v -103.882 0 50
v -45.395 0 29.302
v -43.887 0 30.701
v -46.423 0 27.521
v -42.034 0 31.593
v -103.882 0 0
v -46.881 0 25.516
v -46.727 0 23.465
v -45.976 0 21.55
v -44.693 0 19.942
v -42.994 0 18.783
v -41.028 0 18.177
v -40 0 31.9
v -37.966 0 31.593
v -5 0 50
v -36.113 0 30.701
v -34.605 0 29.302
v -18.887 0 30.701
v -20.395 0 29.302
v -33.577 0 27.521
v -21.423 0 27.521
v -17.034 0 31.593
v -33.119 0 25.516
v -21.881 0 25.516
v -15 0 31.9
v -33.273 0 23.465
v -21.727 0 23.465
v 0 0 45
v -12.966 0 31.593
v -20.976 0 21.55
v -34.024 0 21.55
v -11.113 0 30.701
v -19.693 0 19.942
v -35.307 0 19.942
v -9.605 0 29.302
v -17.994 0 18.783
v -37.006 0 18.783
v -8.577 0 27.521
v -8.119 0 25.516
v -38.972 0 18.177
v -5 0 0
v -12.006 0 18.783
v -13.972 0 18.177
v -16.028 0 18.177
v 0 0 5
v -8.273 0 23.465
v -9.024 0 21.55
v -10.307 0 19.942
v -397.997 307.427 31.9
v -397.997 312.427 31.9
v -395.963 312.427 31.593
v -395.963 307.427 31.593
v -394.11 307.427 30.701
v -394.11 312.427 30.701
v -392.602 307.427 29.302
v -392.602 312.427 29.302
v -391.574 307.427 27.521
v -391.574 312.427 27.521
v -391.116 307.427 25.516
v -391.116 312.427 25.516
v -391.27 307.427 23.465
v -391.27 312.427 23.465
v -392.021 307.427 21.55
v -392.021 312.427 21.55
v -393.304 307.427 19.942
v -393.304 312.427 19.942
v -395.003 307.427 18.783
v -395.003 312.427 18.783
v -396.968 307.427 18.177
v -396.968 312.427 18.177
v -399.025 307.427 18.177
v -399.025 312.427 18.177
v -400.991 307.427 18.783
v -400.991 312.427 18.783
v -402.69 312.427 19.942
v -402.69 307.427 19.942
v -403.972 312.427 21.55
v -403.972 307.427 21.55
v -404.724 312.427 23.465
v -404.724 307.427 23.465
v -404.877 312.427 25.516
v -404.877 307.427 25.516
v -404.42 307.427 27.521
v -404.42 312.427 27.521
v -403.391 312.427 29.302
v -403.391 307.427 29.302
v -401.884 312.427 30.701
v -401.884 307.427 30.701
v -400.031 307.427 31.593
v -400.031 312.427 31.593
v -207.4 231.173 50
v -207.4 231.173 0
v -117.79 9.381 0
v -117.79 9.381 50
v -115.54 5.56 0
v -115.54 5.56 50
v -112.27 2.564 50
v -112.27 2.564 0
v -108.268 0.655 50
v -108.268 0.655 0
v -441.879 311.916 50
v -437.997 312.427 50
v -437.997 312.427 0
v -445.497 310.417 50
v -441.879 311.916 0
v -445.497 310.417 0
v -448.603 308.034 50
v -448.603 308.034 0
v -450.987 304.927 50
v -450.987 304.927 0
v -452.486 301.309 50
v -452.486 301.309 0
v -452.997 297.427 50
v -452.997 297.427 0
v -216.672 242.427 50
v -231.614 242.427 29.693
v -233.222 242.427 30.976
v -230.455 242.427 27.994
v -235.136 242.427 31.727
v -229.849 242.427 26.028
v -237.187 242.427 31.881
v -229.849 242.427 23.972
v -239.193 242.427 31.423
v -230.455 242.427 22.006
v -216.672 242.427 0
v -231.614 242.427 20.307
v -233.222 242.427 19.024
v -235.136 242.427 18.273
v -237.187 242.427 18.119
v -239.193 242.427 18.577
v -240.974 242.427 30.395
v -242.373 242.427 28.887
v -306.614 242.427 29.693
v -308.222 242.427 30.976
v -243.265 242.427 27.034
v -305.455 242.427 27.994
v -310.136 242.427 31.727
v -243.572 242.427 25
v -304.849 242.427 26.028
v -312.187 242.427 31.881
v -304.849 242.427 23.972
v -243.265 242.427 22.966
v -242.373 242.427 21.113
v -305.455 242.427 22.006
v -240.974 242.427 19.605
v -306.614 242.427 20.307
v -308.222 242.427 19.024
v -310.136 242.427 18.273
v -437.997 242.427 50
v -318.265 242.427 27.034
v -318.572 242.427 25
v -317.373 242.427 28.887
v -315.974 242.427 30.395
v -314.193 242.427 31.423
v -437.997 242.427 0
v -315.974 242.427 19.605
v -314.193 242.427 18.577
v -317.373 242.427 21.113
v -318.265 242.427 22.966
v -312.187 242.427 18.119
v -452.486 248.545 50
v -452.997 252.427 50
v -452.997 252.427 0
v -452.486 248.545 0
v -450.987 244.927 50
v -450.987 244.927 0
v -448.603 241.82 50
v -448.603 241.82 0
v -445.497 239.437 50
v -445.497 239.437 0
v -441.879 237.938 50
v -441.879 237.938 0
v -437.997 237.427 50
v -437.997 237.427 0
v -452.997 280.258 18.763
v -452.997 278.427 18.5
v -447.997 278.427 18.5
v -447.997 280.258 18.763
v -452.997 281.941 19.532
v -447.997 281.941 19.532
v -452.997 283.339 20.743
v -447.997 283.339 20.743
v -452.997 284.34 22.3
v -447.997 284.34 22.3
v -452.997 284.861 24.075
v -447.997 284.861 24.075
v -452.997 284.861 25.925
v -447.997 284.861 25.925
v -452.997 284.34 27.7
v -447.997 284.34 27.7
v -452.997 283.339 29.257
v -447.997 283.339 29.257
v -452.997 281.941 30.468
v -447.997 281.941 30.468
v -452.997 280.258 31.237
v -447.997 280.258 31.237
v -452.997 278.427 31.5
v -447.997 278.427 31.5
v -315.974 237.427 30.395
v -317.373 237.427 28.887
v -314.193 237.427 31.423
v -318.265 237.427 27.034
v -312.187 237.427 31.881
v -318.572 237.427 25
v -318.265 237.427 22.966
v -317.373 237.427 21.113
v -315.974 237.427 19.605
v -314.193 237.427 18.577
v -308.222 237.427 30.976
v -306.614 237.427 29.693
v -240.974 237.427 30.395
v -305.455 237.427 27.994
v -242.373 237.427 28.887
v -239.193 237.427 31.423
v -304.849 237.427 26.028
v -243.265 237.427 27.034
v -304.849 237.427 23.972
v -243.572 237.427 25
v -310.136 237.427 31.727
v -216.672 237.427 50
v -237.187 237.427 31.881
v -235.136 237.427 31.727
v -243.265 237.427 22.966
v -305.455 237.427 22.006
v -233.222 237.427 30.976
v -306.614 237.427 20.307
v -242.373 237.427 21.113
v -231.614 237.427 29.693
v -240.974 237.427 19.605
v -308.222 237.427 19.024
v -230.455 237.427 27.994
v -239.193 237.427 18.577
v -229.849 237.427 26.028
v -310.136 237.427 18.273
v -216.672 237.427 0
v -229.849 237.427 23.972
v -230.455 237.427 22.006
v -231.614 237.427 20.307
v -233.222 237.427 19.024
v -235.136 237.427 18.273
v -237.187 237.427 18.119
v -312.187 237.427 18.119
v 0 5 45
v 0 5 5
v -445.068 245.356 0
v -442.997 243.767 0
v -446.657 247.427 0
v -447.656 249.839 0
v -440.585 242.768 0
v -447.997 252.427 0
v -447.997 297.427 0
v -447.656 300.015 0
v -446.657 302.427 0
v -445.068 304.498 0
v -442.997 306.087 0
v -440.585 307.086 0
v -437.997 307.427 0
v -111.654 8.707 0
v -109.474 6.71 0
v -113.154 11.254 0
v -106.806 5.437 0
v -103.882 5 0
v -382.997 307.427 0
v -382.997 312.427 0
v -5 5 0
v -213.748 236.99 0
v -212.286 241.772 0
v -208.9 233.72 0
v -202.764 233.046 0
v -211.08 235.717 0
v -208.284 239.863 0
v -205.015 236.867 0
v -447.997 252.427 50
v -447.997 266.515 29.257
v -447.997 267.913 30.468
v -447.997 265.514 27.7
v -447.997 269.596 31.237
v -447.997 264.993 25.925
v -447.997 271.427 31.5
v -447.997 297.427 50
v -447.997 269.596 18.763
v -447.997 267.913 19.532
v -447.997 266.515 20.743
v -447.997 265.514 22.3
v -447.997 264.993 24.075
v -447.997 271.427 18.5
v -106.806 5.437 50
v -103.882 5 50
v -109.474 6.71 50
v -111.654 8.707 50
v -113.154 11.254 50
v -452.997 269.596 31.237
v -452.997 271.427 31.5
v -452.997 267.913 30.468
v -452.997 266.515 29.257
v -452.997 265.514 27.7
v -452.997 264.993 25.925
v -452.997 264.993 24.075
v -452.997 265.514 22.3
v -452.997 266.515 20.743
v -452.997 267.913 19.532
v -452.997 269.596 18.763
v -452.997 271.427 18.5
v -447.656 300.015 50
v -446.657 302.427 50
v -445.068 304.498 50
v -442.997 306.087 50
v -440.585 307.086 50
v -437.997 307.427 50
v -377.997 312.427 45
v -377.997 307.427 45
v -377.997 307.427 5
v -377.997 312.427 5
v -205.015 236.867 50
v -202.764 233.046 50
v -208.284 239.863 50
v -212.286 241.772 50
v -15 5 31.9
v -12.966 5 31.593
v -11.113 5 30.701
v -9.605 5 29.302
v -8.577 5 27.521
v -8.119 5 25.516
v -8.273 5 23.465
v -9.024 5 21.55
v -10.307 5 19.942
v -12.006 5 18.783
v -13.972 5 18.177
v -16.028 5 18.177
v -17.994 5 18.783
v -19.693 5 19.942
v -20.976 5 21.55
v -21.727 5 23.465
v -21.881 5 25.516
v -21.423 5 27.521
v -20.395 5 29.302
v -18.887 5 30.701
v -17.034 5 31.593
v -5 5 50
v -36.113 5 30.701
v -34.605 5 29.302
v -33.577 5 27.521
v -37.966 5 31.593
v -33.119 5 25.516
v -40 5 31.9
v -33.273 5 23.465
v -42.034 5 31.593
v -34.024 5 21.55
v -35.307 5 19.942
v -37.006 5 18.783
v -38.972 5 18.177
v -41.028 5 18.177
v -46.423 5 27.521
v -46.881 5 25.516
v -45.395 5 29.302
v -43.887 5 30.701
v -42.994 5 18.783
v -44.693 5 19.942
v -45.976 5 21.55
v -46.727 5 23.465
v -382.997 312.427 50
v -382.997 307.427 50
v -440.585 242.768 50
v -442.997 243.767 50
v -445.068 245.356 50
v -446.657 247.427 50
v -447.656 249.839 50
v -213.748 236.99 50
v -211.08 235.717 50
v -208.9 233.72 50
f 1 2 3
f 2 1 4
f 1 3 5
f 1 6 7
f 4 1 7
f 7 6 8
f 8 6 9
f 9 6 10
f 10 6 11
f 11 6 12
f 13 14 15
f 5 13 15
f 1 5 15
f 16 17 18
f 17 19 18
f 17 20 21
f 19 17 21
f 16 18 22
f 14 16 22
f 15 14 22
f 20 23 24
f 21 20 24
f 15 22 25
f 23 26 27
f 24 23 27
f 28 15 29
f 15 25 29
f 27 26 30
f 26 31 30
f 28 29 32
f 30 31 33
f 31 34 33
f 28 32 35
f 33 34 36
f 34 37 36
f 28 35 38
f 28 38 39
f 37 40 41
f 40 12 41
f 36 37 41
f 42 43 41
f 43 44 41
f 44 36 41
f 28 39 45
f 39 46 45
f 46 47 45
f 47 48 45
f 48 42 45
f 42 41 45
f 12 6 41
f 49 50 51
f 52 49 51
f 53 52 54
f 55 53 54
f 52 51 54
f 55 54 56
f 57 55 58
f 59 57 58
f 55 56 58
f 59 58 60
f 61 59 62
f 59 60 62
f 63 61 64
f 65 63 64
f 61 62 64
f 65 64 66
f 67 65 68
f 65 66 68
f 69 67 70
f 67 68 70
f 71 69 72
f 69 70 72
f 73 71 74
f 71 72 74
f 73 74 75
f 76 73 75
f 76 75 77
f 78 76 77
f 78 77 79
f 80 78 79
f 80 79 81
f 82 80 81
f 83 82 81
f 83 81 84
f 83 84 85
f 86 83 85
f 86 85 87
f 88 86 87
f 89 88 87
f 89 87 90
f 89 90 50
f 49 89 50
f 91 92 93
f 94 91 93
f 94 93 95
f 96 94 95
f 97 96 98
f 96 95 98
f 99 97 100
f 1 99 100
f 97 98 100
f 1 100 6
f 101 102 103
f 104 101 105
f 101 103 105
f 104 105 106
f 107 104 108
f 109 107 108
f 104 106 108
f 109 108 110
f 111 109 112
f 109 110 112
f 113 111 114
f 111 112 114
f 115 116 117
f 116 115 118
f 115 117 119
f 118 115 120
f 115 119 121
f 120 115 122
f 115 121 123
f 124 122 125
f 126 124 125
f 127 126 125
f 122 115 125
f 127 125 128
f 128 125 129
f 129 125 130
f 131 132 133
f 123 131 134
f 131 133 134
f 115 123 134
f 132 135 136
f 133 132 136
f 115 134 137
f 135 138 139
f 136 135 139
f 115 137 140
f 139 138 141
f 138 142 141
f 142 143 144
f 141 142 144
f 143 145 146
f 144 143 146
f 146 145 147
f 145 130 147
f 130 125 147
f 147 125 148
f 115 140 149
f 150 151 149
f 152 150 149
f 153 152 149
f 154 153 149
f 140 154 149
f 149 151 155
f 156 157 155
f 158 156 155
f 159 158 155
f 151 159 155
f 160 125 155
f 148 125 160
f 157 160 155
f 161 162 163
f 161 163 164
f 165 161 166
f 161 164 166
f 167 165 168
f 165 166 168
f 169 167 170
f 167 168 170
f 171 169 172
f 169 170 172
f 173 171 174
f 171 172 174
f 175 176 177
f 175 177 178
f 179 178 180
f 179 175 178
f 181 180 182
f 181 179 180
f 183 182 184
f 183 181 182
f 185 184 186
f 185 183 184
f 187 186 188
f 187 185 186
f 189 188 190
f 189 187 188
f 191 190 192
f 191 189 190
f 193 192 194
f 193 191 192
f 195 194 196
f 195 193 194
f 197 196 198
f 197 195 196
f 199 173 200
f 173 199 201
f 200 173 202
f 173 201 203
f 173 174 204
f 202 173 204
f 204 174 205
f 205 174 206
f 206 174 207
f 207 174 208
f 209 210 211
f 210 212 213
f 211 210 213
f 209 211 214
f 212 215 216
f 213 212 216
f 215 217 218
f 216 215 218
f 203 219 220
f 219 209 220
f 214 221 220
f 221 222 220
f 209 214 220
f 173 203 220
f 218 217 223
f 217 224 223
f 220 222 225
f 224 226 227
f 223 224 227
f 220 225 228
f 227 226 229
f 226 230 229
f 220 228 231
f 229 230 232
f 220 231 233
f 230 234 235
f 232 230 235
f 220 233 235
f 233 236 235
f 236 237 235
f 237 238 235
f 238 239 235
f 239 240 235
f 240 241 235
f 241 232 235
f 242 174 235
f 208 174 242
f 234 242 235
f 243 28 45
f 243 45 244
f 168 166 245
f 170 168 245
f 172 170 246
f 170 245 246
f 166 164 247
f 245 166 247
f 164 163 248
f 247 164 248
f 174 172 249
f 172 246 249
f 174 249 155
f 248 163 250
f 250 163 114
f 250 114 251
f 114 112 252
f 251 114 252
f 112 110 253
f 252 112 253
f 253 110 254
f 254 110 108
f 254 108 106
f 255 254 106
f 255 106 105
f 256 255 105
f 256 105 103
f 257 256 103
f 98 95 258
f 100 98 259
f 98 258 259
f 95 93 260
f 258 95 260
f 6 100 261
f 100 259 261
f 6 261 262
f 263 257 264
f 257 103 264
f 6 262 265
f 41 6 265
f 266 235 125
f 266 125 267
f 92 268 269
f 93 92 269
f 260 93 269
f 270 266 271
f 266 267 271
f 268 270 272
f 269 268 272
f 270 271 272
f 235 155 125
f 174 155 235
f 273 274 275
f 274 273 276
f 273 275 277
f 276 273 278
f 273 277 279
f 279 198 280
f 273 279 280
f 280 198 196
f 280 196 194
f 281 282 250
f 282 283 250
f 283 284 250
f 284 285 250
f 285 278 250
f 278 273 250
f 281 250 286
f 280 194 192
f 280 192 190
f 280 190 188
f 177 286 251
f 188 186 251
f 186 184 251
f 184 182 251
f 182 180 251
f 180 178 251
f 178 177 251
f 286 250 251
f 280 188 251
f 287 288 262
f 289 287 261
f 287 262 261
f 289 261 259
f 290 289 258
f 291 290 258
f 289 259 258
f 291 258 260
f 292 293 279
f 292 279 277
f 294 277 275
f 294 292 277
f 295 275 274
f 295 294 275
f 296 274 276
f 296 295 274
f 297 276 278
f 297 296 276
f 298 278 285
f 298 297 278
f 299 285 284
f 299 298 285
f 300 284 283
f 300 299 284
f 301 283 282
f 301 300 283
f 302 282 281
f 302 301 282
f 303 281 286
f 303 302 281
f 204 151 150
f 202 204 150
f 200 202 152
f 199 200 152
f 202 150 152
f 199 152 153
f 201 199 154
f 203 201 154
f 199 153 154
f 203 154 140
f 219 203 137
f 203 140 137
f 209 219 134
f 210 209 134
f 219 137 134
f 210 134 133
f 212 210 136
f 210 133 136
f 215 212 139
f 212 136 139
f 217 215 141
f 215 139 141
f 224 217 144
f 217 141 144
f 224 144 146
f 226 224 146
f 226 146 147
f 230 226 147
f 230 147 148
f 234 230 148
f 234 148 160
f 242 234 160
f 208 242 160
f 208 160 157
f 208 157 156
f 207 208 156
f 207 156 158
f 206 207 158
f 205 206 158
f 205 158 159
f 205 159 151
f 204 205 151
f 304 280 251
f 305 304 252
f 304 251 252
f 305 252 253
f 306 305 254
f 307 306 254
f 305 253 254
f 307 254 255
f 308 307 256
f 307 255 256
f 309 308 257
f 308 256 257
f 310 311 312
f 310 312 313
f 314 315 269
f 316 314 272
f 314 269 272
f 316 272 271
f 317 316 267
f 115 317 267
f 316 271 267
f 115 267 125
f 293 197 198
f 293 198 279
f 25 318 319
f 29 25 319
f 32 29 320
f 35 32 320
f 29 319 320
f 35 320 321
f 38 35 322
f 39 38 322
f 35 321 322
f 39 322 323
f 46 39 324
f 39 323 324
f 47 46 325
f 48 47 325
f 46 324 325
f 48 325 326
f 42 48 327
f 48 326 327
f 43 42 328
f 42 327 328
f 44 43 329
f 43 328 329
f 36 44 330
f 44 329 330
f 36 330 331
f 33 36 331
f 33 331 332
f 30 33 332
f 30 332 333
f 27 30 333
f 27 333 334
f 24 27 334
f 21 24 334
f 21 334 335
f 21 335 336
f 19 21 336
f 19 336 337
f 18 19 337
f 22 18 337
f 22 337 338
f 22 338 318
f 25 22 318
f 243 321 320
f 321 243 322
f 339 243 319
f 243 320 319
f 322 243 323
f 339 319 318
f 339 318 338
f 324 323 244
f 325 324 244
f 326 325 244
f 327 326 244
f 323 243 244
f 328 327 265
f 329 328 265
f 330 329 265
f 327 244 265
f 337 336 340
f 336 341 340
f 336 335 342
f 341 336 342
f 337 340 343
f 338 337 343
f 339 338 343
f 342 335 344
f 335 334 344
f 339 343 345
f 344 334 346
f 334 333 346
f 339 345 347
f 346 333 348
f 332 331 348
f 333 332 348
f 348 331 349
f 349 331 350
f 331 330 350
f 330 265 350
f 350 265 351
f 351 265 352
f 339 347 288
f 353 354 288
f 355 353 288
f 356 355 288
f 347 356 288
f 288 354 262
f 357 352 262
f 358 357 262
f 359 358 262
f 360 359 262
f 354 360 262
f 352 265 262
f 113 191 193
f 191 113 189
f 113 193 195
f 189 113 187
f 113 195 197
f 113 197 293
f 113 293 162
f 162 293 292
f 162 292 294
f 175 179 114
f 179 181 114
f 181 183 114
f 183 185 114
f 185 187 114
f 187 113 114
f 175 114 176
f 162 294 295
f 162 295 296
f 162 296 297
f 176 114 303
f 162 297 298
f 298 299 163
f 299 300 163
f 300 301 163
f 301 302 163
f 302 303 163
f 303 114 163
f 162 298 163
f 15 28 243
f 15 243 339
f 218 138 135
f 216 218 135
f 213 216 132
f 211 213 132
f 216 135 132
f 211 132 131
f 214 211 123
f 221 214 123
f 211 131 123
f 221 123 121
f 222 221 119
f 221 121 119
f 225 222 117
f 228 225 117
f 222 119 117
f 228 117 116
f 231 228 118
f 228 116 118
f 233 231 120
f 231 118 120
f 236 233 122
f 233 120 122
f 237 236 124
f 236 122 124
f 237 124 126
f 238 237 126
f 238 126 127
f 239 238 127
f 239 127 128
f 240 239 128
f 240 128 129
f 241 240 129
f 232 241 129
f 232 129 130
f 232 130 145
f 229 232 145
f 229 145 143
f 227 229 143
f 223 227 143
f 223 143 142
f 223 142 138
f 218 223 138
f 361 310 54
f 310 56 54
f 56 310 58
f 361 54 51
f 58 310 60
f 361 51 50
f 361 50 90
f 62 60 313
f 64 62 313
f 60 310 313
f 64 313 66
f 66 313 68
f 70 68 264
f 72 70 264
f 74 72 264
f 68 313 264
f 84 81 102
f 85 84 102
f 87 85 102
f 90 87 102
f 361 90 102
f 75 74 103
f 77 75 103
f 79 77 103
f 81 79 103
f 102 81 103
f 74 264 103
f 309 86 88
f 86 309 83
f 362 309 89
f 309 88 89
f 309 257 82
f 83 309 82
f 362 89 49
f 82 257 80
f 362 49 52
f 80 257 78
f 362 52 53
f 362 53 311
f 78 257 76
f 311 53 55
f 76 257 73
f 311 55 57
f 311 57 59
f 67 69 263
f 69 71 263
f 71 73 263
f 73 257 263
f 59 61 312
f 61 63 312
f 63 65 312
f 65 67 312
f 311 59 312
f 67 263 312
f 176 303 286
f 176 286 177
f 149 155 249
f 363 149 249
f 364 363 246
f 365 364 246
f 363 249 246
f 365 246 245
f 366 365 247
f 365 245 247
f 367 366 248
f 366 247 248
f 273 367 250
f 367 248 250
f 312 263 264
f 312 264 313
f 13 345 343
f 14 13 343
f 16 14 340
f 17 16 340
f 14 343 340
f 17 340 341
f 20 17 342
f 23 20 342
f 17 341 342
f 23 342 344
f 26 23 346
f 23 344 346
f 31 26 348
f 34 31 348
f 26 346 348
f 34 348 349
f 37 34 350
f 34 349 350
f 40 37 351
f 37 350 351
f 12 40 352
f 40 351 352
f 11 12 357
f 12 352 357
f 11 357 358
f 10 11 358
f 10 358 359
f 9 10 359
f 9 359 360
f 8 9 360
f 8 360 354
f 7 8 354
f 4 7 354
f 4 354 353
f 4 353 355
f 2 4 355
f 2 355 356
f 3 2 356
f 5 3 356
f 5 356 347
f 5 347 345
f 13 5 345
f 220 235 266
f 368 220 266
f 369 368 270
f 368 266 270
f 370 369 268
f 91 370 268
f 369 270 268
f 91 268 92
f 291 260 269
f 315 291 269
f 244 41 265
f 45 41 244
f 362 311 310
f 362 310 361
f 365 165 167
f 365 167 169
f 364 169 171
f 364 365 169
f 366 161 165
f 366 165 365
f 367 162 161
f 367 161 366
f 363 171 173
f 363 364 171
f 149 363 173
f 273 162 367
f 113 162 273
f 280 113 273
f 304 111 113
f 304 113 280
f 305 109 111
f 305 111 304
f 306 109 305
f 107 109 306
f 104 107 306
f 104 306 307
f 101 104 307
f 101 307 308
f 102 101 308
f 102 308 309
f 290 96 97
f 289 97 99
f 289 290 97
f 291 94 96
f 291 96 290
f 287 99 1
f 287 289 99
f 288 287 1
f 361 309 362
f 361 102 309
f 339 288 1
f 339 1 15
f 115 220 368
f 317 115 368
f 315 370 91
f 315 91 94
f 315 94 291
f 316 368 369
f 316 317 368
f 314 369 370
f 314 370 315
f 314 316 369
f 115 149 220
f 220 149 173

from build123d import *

# Parameters (mm, degrees)
SM_BASE_FLANGE_1_DEPTH = 50
SKETCH_3_R             = 6.9
CUT_EXTRUDE_2_DEPTH    = 10
OTHER_1_DEPTH          = 5
OTHER_START            = 307.42699492
OTHER_1_2_DEPTH        = 5
CUT_EXTRUDE_3_DEPTH    = 10
SKETCH_5_R             = 6.9
CUT_EXTRUDE_4_DEPTH    = 10
SKETCH_6_R             = 6.9
CUT_EXTRUDE_5_DEPTH    = 10


# Read off the part's stored shape, not the designer's step: Затупленный угол1
# Sheet-metal steps are written as plain solids
with BuildPart() as part:
    # Sketch 1 → Базовая кромка1 (new body)
    with BuildSketch(Plane.XY):
        with BuildLine():
            Line((-377.996732669, 312.42699492), (-437.996732669, 312.42699492))
            ThreePointArc((-437.996732669, 312.42699492), (-448.603334387, 308.033596638), (-452.996732669, 297.42699492))
            Line((-452.996732669, 297.42699492), (-452.996732669, 252.42699492))
            ThreePointArc((-452.996732669, 252.42699492), (-448.603334387, 241.820393202), (-437.996732669, 237.42699492))
            Line((-437.996732669, 237.42699492), (-216.671817837, 237.42699492))
            ThreePointArc((-216.671817837, 237.42699492), (-211.079888803, 235.717370646), (-207.399979292, 231.173060854))
            Line((-207.399979292, 231.173060854), (-117.790130066, 9.380901099))
            ThreePointArc((-117.790130066, 9.380901099), (-112.270265799, 2.564436412), (-103.882372247, 0))
            Line((-103.882372247, 0), (0, 0))
            Line((0, 0), (0, 5))
            Line((0, 5), (-103.882372247, 5))
            ThreePointArc((-103.882372247, 5), (-109.474301282, 6.709624274), (-113.154210793, 11.253934066))
            Line((-113.154210793, 11.253934066), (-202.764060019, 233.046093821))
            ThreePointArc((-202.764060019, 233.046093821), (-208.283924285, 239.862558508), (-216.671817837, 242.42699492))
            Line((-216.671817837, 242.42699492), (-437.996732669, 242.42699492))
            ThreePointArc((-437.996732669, 242.42699492), (-445.067800481, 245.355927108), (-447.996732669, 252.42699492))
            Line((-447.996732669, 252.42699492), (-447.996732669, 297.42699492))
            ThreePointArc((-447.996732669, 297.42699492), (-445.067800481, 304.498062732), (-437.996732669, 307.42699492))
            Line((-437.996732669, 307.42699492), (-377.996732669, 307.42699492))
            Line((-377.996732669, 307.42699492), (-377.996732669, 312.42699492))
        make_face()
    extrude(amount=SM_BASE_FLANGE_1_DEPTH)

    # Эскиз3 → Вырез-Вытянуть2 (cut)
    with BuildSketch(Plane(origin=(0, 5, 0), x_dir=(1, 0, 0), z_dir=(0, 1, 0))):
        with Locations(Location((-15, -25, 0), (0, 0, 270))):
            Circle(SKETCH_3_R)
        with Locations(Location((-40, -25, 0), (0, 0, 270))):
            Circle(SKETCH_3_R)
    extrude(amount=-CUT_EXTRUDE_2_DEPTH, mode=Mode.SUBTRACT)

    # Other 1 outline → Other 1 (cut)
    with BuildSketch(Plane(origin=(0, 0, 0), x_dir=(1, 0, 0), z_dir=(0, 1, 0))):
        Polygon((0, 0), (-5, 0), (0, -5), align=None)
        Polygon((0, -50), (0, -45), (-5, -50), align=None)
    extrude(amount=OTHER_1_DEPTH, mode=Mode.SUBTRACT)

    # Other 1 2 outline → Other 1 2 (cut)
    with BuildSketch(Plane(origin=(0, 0, 0), x_dir=(1, 0, 0), z_dir=(0, 1, 0)).offset(OTHER_START)):
        Polygon((-377.996732669, -50), (-377.996732669, -45), (-382.996732669, -50), align=None)
        Polygon((-382.996732669, 0), (-377.996732669, -5), (-377.996732669, 0), align=None)
    extrude(amount=OTHER_1_2_DEPTH, mode=Mode.SUBTRACT)

    # Эскиз4 → Вырез-Вытянуть3 (cut)
    with BuildSketch(Plane.ZY.offset(452.996732669)):
        with BuildLine():
            Line((18.5, 271.42699492), (18.5, 278.42699492))
            ThreePointArc((18.5, 278.42699492), (25, 284.92699492), (31.5, 278.42699492))
            Line((31.5, 278.42699492), (31.5, 271.42699492))
            ThreePointArc((31.5, 271.42699492), (25, 264.92699492), (18.5, 271.42699492))
        make_face()
    extrude(amount=-CUT_EXTRUDE_3_DEPTH, mode=Mode.SUBTRACT)

    # Эскиз5 → Вырез-Вытянуть4 (cut)
    with BuildSketch(Plane(origin=(0, 312.42699492, 0), x_dir=(1, 0, 0), z_dir=(0, 1, 0))):
        with Locations(Location((-397.996732669, -25, 0), (0, 0, 270))):
            Circle(SKETCH_5_R)
    extrude(amount=-CUT_EXTRUDE_4_DEPTH, mode=Mode.SUBTRACT)

    # Эскиз6 → Вырез-Вытянуть5 (cut)
    with BuildSketch(Plane(origin=(0, 242.42699492, 0), x_dir=(1, 0, 0), z_dir=(0, 1, 0))):
        with Locations(Location((-311.671817837, -25, 0), (0, 0, 180))):
            Circle(SKETCH_6_R)
        with Locations(Location((-236.671817837, -25, 0), (0, 0, 180))):
            Circle(SKETCH_6_R)
    extrude(amount=-CUT_EXTRUDE_5_DEPTH, mode=Mode.SUBTRACT)


solid = part.part
